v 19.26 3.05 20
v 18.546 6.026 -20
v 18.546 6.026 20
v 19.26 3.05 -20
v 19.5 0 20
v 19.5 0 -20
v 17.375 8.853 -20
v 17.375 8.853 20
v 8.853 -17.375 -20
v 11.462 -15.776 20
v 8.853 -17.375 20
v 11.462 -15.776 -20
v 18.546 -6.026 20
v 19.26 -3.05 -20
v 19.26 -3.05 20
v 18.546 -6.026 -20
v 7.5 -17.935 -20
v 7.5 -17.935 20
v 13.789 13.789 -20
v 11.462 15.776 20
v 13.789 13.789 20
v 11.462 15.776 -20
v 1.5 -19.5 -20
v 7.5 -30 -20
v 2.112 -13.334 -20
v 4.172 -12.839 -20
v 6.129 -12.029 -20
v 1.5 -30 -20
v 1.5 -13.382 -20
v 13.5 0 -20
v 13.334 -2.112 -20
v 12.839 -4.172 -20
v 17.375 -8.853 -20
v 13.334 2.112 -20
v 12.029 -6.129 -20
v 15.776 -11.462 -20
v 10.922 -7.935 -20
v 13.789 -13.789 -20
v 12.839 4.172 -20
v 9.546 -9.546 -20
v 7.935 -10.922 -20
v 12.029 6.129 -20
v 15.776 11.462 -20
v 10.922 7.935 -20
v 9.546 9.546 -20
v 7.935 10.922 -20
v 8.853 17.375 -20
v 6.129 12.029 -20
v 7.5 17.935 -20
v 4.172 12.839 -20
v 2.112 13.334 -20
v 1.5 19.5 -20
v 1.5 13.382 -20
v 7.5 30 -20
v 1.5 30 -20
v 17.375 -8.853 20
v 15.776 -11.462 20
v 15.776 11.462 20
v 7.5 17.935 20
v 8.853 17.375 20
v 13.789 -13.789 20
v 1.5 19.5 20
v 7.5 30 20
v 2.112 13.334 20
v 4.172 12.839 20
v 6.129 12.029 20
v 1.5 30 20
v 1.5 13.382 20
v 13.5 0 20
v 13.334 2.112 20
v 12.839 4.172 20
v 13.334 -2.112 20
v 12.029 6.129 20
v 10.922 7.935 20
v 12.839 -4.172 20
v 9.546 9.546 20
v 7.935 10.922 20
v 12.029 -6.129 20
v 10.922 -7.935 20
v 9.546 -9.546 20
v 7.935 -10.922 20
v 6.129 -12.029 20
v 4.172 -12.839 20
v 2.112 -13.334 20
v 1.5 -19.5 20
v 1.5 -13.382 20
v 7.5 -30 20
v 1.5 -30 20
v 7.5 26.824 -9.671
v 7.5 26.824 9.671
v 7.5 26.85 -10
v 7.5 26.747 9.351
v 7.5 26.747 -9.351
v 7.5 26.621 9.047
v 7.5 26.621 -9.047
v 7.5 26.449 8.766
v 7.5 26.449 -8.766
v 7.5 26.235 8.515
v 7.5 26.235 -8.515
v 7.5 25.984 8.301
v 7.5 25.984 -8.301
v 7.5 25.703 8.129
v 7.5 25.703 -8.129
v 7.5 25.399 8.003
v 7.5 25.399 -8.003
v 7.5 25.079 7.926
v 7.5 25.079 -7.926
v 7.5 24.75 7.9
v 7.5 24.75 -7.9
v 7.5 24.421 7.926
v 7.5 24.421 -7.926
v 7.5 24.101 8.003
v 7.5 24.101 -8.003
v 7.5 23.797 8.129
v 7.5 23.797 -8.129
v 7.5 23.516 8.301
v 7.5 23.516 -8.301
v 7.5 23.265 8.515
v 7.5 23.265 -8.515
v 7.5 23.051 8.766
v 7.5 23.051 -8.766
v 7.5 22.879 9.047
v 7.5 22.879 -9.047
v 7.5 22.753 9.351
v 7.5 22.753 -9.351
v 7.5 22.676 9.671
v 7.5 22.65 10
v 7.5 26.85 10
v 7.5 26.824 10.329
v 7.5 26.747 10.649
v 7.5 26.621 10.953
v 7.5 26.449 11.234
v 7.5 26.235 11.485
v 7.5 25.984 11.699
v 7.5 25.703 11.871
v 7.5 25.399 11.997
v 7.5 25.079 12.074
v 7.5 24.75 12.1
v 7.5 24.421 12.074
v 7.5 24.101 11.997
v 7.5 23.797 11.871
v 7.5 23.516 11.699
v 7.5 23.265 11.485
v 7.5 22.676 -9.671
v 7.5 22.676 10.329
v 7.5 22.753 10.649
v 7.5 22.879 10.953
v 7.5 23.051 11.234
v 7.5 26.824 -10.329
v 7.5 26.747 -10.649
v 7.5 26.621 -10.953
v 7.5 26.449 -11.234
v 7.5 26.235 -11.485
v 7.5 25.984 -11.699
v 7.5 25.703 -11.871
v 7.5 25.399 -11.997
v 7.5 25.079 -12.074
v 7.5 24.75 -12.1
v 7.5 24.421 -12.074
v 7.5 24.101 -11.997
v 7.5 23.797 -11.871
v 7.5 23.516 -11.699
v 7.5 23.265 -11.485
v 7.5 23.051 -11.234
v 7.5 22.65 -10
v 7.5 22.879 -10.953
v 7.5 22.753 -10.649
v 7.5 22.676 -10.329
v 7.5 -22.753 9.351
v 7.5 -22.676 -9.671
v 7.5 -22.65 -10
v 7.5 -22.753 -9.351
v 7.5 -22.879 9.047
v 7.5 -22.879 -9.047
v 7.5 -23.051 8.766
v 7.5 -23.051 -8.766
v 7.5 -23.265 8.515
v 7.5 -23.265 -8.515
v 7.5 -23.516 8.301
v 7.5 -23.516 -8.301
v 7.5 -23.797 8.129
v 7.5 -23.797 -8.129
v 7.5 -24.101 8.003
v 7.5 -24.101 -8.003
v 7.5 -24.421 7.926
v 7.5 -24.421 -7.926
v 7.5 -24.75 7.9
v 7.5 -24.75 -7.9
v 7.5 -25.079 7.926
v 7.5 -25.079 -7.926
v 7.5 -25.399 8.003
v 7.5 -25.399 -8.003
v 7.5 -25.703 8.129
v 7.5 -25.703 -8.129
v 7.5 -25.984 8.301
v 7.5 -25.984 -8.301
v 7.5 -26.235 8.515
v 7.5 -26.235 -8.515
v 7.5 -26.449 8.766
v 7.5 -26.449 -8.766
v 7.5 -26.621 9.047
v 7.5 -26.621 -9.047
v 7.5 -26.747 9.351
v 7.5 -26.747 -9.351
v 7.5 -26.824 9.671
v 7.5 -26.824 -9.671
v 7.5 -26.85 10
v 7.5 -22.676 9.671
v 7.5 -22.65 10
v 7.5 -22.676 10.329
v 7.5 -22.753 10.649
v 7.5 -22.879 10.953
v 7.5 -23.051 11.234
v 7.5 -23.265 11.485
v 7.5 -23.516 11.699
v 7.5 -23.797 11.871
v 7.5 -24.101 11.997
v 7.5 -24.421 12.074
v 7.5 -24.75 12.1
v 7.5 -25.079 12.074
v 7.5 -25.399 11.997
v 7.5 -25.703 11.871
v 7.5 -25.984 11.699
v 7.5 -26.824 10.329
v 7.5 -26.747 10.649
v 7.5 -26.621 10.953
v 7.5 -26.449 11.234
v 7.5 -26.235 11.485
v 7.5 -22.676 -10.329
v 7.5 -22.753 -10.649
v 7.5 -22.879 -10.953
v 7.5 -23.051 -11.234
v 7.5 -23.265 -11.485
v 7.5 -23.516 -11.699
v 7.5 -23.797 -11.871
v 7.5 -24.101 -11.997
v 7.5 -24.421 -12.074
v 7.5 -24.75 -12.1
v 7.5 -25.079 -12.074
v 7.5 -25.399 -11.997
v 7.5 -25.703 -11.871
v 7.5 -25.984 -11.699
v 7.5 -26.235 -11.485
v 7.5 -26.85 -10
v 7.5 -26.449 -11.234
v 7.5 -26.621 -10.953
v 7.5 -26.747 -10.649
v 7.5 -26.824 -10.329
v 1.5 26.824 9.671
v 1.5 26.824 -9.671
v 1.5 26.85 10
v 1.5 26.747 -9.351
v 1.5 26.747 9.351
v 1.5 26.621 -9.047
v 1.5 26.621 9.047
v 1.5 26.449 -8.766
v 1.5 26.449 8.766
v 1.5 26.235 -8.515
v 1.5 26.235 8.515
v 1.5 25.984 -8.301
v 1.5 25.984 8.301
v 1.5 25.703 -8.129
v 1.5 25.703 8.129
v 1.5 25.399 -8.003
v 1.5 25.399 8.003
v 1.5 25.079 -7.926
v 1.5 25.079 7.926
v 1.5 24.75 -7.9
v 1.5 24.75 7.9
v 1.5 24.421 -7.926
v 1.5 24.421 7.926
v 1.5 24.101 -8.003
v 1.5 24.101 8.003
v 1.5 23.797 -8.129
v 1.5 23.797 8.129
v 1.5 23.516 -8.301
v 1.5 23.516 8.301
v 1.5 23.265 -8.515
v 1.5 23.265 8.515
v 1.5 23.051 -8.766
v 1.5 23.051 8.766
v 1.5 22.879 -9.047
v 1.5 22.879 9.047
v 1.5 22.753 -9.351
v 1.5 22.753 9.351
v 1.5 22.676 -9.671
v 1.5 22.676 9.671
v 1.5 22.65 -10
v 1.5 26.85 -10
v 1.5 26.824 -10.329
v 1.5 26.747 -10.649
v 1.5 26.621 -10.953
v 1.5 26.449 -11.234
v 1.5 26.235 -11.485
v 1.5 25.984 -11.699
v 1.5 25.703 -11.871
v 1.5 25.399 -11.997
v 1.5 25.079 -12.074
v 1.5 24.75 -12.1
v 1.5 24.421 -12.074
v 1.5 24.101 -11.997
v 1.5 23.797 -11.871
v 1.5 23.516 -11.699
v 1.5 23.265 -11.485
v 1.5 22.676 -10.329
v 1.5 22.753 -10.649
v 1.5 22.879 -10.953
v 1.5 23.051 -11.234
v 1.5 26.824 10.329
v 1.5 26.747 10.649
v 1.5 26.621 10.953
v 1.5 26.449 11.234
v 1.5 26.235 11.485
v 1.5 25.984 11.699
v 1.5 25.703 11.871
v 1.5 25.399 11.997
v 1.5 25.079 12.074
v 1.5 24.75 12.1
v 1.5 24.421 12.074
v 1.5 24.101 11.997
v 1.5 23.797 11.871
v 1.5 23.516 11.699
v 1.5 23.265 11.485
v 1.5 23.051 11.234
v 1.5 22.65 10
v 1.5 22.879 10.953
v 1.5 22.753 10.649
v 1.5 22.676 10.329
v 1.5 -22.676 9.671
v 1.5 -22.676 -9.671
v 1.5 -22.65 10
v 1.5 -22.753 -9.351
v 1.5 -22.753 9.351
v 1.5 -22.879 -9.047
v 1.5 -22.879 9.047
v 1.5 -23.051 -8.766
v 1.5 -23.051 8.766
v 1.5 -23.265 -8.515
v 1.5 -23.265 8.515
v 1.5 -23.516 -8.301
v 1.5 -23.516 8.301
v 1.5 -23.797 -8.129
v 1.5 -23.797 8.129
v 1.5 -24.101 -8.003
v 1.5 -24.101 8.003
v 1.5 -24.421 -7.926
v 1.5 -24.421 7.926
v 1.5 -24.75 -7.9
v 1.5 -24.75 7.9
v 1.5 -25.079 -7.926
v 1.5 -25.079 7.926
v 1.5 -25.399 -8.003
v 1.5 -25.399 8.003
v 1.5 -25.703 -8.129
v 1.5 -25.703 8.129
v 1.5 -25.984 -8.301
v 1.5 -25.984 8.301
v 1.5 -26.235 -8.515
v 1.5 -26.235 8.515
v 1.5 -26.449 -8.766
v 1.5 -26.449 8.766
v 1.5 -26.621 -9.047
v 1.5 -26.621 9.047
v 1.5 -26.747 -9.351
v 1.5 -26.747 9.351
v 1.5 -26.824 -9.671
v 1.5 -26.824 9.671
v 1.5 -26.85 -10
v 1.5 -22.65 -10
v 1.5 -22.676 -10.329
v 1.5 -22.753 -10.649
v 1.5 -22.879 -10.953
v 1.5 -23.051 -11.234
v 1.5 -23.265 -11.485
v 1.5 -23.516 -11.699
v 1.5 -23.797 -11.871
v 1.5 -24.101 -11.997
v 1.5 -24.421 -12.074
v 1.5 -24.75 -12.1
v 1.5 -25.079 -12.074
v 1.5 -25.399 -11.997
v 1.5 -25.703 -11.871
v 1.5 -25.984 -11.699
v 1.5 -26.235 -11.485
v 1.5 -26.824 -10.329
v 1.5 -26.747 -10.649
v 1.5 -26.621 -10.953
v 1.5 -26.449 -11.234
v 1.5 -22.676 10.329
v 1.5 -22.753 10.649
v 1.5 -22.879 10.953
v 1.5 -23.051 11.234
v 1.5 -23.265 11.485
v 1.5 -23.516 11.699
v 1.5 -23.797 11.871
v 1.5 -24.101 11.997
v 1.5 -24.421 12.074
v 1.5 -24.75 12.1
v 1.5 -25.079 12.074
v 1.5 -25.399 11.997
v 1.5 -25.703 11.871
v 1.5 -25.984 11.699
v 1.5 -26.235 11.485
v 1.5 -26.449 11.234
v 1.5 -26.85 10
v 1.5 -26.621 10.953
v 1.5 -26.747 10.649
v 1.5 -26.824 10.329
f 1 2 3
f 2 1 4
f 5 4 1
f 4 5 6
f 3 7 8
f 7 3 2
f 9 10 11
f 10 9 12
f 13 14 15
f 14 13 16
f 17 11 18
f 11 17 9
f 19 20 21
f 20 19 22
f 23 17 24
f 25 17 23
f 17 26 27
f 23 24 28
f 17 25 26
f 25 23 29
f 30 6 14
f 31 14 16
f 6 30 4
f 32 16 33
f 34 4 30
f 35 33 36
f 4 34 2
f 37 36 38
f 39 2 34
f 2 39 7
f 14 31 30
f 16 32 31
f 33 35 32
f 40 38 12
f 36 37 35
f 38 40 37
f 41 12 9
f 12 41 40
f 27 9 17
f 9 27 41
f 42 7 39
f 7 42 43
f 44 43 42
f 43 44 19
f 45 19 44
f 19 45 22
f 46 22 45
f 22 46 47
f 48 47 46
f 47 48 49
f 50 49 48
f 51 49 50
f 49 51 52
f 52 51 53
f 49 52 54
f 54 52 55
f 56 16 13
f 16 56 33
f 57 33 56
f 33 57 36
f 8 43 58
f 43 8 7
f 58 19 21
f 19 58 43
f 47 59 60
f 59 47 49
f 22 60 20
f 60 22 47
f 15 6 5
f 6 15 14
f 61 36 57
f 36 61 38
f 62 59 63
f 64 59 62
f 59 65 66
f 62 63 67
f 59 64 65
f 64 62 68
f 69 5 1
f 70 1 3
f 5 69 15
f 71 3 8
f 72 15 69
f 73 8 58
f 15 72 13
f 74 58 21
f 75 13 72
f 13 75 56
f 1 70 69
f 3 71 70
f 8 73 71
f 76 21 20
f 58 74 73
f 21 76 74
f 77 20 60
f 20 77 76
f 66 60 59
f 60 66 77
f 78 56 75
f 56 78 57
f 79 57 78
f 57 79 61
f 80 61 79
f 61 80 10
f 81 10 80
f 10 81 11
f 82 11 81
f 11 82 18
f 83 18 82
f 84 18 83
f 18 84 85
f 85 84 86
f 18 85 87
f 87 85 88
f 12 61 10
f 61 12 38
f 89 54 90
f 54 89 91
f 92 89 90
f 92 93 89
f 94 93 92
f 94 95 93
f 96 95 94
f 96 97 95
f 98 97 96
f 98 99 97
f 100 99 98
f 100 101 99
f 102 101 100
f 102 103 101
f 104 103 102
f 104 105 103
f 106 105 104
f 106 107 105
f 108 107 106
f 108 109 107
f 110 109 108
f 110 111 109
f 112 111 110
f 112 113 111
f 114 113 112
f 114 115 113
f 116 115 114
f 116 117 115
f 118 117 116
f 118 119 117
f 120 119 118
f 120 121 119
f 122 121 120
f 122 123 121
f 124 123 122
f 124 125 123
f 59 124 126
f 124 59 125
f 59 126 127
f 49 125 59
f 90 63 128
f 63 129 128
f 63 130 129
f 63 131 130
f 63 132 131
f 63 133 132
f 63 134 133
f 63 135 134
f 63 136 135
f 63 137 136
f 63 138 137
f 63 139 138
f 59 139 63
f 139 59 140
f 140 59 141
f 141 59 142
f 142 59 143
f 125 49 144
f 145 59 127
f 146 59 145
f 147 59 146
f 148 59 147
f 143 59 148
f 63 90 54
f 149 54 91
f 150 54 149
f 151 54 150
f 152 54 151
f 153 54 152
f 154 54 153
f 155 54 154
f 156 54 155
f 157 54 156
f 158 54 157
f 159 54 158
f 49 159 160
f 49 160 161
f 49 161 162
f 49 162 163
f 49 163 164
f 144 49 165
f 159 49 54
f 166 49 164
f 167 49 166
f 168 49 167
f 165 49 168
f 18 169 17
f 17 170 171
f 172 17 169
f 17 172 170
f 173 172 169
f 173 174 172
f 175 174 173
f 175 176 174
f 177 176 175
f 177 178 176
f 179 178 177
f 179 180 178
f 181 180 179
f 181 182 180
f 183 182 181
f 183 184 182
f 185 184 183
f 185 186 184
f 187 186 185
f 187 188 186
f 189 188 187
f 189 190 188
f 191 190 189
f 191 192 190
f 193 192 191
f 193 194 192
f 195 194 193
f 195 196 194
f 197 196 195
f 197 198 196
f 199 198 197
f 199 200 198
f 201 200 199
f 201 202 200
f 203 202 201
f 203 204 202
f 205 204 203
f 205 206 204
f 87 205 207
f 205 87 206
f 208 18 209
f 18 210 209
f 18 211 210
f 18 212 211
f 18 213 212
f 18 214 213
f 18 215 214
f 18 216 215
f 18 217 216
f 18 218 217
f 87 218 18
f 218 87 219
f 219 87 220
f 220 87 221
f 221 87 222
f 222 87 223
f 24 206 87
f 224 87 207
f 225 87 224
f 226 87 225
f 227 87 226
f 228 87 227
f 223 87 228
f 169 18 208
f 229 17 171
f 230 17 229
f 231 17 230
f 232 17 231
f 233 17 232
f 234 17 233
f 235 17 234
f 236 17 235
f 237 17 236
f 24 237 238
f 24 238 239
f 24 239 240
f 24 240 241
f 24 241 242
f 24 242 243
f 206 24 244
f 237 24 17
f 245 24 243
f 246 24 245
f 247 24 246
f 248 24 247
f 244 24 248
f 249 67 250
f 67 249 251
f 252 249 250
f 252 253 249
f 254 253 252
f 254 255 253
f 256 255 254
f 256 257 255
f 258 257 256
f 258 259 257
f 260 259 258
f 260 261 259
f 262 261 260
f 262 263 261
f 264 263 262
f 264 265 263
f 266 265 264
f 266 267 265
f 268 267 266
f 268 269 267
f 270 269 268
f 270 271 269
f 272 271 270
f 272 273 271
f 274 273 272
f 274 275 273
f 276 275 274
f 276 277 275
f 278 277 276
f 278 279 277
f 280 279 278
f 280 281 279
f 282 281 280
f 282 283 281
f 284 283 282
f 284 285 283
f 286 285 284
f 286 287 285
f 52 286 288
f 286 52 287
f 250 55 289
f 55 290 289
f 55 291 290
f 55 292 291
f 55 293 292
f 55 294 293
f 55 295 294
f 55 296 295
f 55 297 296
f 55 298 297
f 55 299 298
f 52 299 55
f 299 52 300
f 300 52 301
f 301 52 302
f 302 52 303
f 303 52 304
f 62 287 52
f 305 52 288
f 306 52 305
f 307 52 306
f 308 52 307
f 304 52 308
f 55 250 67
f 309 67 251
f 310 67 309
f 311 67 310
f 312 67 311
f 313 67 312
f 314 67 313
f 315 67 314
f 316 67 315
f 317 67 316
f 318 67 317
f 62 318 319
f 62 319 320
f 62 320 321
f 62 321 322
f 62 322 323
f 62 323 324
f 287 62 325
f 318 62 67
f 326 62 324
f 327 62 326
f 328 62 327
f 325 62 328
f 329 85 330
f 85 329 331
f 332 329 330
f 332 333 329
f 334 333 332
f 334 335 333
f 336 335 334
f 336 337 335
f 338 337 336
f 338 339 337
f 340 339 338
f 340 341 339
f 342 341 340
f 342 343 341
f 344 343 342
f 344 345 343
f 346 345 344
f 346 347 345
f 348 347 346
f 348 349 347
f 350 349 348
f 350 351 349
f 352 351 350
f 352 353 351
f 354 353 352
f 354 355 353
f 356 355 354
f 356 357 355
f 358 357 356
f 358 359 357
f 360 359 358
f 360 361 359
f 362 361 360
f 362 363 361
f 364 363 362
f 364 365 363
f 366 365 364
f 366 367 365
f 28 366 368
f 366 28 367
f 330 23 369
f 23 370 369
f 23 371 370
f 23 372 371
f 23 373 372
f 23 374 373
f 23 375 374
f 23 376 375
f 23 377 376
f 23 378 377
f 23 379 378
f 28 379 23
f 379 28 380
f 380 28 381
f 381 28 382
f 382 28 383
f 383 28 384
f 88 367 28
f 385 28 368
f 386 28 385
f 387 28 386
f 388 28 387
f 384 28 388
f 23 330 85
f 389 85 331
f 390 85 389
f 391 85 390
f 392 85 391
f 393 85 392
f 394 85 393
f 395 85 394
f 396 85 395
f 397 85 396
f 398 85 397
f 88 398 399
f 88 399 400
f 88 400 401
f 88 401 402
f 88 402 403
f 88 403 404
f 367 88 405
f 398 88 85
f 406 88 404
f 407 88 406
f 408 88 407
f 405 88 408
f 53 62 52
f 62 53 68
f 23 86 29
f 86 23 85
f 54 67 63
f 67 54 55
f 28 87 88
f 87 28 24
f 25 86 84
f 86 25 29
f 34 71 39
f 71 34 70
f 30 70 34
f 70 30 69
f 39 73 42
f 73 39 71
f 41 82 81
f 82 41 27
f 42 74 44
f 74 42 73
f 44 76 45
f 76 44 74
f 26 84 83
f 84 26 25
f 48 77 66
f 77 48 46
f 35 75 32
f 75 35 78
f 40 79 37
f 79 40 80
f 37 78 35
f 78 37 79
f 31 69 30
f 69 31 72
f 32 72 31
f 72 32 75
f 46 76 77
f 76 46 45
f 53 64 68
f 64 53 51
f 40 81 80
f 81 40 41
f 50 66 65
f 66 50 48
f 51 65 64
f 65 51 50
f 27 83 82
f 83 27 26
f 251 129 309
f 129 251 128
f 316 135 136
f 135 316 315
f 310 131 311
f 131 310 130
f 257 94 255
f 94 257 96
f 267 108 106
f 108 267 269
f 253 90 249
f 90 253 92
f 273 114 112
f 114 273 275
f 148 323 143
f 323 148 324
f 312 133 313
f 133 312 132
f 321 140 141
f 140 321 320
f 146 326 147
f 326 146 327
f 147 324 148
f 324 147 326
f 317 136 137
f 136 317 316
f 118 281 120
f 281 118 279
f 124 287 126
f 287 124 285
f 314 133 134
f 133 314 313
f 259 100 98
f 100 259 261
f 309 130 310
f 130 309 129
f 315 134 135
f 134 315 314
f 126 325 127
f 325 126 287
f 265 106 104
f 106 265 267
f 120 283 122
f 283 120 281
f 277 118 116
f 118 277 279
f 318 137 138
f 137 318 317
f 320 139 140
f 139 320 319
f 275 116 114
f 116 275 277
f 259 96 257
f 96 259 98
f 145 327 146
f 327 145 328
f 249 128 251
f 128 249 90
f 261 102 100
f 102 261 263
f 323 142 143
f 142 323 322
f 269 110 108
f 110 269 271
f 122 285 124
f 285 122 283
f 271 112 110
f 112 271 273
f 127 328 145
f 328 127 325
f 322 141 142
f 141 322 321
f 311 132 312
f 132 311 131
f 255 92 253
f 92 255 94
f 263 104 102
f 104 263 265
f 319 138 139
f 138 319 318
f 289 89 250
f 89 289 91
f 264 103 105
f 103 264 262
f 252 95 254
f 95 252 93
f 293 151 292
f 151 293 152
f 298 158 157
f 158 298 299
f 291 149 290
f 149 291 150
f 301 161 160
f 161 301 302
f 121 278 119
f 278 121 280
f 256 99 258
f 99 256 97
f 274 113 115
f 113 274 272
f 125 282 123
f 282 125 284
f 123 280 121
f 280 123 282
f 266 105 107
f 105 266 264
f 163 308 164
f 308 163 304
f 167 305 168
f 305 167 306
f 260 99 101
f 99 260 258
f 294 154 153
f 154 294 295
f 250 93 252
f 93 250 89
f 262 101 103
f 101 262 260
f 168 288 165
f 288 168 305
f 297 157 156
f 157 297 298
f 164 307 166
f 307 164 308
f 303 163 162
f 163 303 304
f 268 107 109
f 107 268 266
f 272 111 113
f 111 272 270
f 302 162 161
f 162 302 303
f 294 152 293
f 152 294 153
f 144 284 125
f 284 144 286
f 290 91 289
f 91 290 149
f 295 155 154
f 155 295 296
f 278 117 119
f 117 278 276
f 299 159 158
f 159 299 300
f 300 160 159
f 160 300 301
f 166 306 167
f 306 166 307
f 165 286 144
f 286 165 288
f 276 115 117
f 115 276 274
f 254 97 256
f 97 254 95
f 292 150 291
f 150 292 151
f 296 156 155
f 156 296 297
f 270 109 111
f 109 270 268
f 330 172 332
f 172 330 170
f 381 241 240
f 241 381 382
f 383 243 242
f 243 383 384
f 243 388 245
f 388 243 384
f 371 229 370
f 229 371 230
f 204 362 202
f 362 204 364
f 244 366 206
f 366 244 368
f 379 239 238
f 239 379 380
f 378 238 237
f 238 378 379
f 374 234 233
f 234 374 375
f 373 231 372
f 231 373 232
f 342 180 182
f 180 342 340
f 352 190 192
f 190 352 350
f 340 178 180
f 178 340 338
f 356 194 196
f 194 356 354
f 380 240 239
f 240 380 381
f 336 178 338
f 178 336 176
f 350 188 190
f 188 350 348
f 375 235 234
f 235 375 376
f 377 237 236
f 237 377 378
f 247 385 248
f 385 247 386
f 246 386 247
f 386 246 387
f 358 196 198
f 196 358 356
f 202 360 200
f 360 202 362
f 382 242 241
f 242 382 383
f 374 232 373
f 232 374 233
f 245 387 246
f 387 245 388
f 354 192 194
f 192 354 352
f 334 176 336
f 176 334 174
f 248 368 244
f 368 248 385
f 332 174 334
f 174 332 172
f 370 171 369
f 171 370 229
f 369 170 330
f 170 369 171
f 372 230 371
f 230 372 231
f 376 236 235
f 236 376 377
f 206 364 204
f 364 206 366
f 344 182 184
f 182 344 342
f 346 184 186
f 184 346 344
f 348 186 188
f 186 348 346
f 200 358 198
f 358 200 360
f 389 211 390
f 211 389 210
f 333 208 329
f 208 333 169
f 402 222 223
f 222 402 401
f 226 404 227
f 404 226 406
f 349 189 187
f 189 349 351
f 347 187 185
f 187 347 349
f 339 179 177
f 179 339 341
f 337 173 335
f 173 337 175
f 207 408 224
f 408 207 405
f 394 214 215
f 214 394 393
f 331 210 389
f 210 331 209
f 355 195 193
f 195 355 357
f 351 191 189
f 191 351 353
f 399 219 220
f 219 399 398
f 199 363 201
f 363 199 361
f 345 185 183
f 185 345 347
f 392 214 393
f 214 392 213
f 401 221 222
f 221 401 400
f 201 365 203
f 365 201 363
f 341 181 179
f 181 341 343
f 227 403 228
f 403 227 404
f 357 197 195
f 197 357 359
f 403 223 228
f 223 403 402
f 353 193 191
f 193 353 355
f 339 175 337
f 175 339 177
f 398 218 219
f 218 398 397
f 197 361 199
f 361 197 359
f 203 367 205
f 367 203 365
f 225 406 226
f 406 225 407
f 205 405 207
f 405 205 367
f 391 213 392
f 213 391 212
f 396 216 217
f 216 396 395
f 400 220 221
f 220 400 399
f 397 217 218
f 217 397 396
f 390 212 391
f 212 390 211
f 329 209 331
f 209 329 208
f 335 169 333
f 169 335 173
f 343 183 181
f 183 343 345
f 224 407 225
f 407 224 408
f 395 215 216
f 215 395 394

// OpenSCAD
// file: ../SRC/WINDGAUGE01A_D02.scad
$fn=40; // model faces resolution.
include <../configuration.scad>



//Drzak na sloup - cast bez drzaku anemometru
module WINDGAUGE01A_D02(){
	
difference()
    {
    union()
        {
        //základní válec
        cylinder(h=D02_vyska_uchytky,r=(D02_prumer_obruby+2*D02_sila_materialu)/2,center=true);
		//úchytové plošky		
        translate([D02_dotahova_vzdalenost+D02_sila_materialu/2,0,0]){cube([D02_sila_materialu,D02_delka_celeho_uchytu,D02_vyska_uchytky],center=true);}
		}
    
    //válec na odečet
    cylinder(h=D02_vyska_uchytky+0.01,r=D02_prumer_obruby/2,center=true);     
	        
    //kvádr na odecet
	translate([D02_dotahova_vzdalenost-(D02_prumer_obruby+2*D02_sila_materialu)/2,0,0]){cube([D02_prumer_obruby+2*D02_sila_materialu,D02_prumer_obruby+2*D02_sila_materialu,D02_vyska_uchytky+0.01],center=true);}
		
	//otvory na sroub
	translate([D02_dotahova_vzdalenost,(D02_delka_celeho_uchytu/2-D02_prumer_obruby/2-D02_sila_materialu)/2+D02_prumer_obruby/2+D02_sila_materialu,D02_vyska_uchytky/4]){rotate([0,90,0]){cylinder(h=D02_sila_materialu+0.01,r=D02_prumer_uchytneho_sroubu/2);}}
        
    translate([D02_dotahova_vzdalenost,(D02_delka_celeho_uchytu/2-D02_prumer_obruby/2-D02_sila_materialu)/2+D02_prumer_obruby/2+D02_sila_materialu,-D02_vyska_uchytky/4]){rotate([0,90,0]){cylinder(h=D02_sila_materialu+0.01,r=D02_prumer_uchytneho_sroubu/2);}}
        
	translate([D02_dotahova_vzdalenost,-((D02_delka_celeho_uchytu/2-D02_prumer_obruby/2-D02_sila_materialu)/2+D02_prumer_obruby/2+D02_sila_materialu),-D02_vyska_uchytky/4]){rotate([0,90,0]){cylinder(h=D02_sila_materialu+0.01,r=D02_prumer_uchytneho_sroubu/2);}}

    translate([D02_dotahova_vzdalenost,-((D02_delka_celeho_uchytu/2-D02_prumer_obruby/2-D02_sila_materialu)/2+D02_prumer_obruby/2+D02_sila_materialu),D02_vyska_uchytky/4]){rotate([0,90,0]){cylinder(h=D02_sila_materialu+0.01,r=D02_prumer_uchytneho_sroubu/2);}}	
	
    }
}

//WINDGAUGE02A_D02();
// file: ../configuration.scad
//$fn=40; // model faces resolution.

//COMMON PARAMETERS
global_clearance = 0.5; // additional space where needed due to printer precision
layer_thickness = 0.3; // layer which is going to be removed after printing
//M3 x 12 Bolt
M3_nut_diameter = 6.6;
M3_nut_height = 2.7;
M3_bolt_diameter = 3.2;
M3_bolt_head_height = 3;
M3_bolt_length = 12;
//M5 Bolt
M5_bolt_diameter = 5.5;
M5_nut_height = 4.5;
M5_nut_diameter = 9.4;
//M6 Bolt
M6_bolt_diameter = 6.5;
M6_nut_height = 4.9;
M6_nut_diameter = 11.8;


//----------------------------------------------------------------
//----------------------------------------------------------------
//WINDGAUGE02A_S02 - Parametry pro hlavni valec anemometru
S01_hloubka_zavitu=4;
S01_vyska=110; //80
S01_prumer_vnitrni=50;
S01_sila_materialu=1.2;
S01_vyska_horni_zavit=10;
S01_vyska_spodniho_zavitu=10;
S01_sila_drzaku_RJ11=3; //vyška drážky
S01_hrana_A_RJ11=12.3;
S01_hrana_B_RJ11=19;
S01_tolerance_zavit=1.5;

//Rozměry ložiska se závity
//LO_spodni_prumer=22;
LO_spodni_prumer=17.2; //bez krytu
LO_vyska_bez_krytu=15;
LO_doraz_prumer=44.3;
LO_horni_prumer=7.7;
LO_vyska_spodni_doraz=5;
LO_vyska_horni_doraz=9;
LO_vyska_dorazu=0;





//Obecné parametry
prumer_osicky=5.1;



//Parametry loziska
lozisko_prumer_vnitrni=4.9;
lozisko_prumer_vnejsi=16.1;
lozisko_vyska=5;
lozisko_prekryv=1.5;

//Parametry magnetu
magnet_prumer=6.3;
magnet_vyska=5;
magnet_zapusteni=2;
magnet_tolerance_prumeru=0.2;

//Parametry sroubu
prumer_sroubu=3.4;
prumer_hlavy_sroubu=8.2;
vyska_hlavy_sroubu=4.3;
vyska_matky=3;
sirka_matky=6.7;

sirka_matky_tol=0.175;
prumer_orechu=10;

//WINDGAUGE02A_R01 //pro lopatku
L01_hrana_drzaku_a=10;
L01_hrana_drzaku_b=3;
L01_delka_uchytu=19;
L01_prumer_lopatky=40;
L01_sila_materialu_lopatky=0.9;

//WINDGAUGE02A_D02 Anemometer holder
//   | |   Top ring with Screw-thread
//  /   \  Body
// |_____| Base
D02_magnet_base_height = 4.5 + 1.5*global_clearance; // HS-13 M5 magnet height without bolt
D02_magnet_diameter = 16.1 + global_clearance; // HS-13 M5 magnet diameter
D02_flat_magnet_diameter = 18.1 + global_clearance; // HS-13 M5 magnet diameter
D02_wall_thickness = 5; // body wall thickness
D02_connector_spacing = 40; // main body cut-through for connectors
D02_base_diameter = 140; // diameter of holder base
D02_base_height = max(M6_nut_height + 1.5,
                      D02_magnet_base_height + M5_nut_height/2 + 1.5); // height of holder base
D02_body_height = 60 - D02_base_height; // height of body between base and top ring
D02_screw_diameter = S01_prumer_vnitrni - S01_tolerance_zavit; // scew-thread diameter based on stand S01
D02_thread_height = S01_vyska_spodniho_zavitu; // screw-thread height based on stand S01
D02_top_ring_inner_diameter = D02_screw_diameter - 6; // inner diameter of top ring
D02_top_ring_outer_diameter = D02_screw_diameter + 4; // outer diameter of top ring
D02_top_ring_height = D02_thread_height + 5; // height of top ring
D02_total_height = D02_base_height + D02_body_height + D02_top_ring_height; // total height of anemometer holder
// Following parameters are obsolete, maintained only for compatibility.
D01_material_pod_zavitem = D02_top_ring_height - D02_thread_height;
D01_material_za_zavitem = D02_screw_diameter - D02_top_ring_inner_diameter;
D01_material_pred_zavitem = D02_top_ring_outer_diameter - D02_screw_diameter;
D01_polomer_zakladny = D02_base_diameter/2;
D01_sila_setny_spodniho_drzaku=D02_wall_thickness;
D01_vyska_spodni_casti_drzaku = D02_body_height + D02_base_height;
D01_sirka_otvoru_pro_konektor = D02_connector_spacing;
D01_ucyhtna_matice_material_nad = D02_base_height - M6_nut_height;
D01_uchytna_matice_vyska = M6_nut_height;
D01_uchytna_matice_sirka = M6_nut_diameter;
D01_uchytny_sroub_prumer = M6_bolt_diameter;

// Following parameters are actually used in D01 model.
//WINDGAUGE02A_D02 //uchyt na sloup
D02_sila_materialu=6;
D02_vyska_uchytky=40;
D02_prumer_obruby=27; // 3/4 trubka
D02_delka_celeho_uchytu=60;
D02_dotahova_vzdalenost=1.5;
D02_prumer_uchytneho_sroubu=4.2;
D02_sirka_matky=9.1; //pro M4
D02_vyska_matky=3;


//WINDGAUGE02A_R01 //rotor s prekritim statoru
R01_vyska_prekryti_statoru=10;
R01_sila_materialu_pro_prekriti=1.3;
R01_mezera_mezi_statorem_rotorem=3;

//WINDGAUGE02A_R03 //drzak magnetu
R05_sirka_matky=10;



R03_prumer_zavitu=40;
R04_zavit_vyska=5;
R02_zavit_vyska=10;
R01_zavit_vyska=5;
R03_mezera_mezi_statorem_rotorem=3;

R02_delka_kridla=45;
R02_vzdalenost_der=25;

R02_delka_vyrovnnavaci_tyce=35;
R02_hrana_drzaku=14;
R02_sila_materialu_pod_tyci=5;
R02_sila_materialu_kridla=1.2;
R02_sila_materialu_kridla_tolerance=0.3;

R05_vyska_kridla=100;
R05_delka_kridla=100;


//S04
I2CDIFF01A_sirka_kon=16.5; //sirka konektoru
I2CDIFF01A_vyska_kon=13.5; //vyska konektoru
I2CDIFF01A_sirka_mod_otvory=4; //kolik modul zabira der
I2CDIFF01A_vyska_PCB=2; //vyska mezi albase a konektorem
S04_sila_materialu=2;

//S04_USBI2C01A
USBI2C01A_sirka_kon=12; //sirka konektoru
USBI2C01A_vyska_kon=11; //vyska konektoru
USBI2C01A_sirka_mod_otvory=3; //kolik modul zabira der
USBI2C01A_vyska_PCB=2; //vyska mezi albase a konektorem


//WINDGAUGE03A_R03 // Venturi tube
R03_wide_D = 36; // Venturi wide tube inner diameter
R03_narrow_D = R03_wide_D/1.4; // Venturi narrow tube inner diameter
R03_global_clearance = global_clearance; // additional space where needed due to printer precision
R03_PCB_top_rim = 5.5; // vertical distance from top of tube to top of PCB
R03_PCB_height = 41; // height of PCB casing - if changed check casing
R03_PCB_width = 14; // width of PCB casing - if changed check casing
R03_PCB_depth = 3.7; // depth of PCB casing - if changed check casing
R03_PCB_connector_overlay = 2.5; // additional depth of PCB casing on connectors side - if changed check casing
R03_PCB_elevation = 2; // additional elevation of PCB for waterproofing
R03_air_tube_diameter = 2; // air tubes diameter
R03_sensor_housing_offset = 15;  // distance from venturi tube height to sensor housing drop
R03_sensor_offset = 2.2;  // SDP33 distance from PCB border to sensor
R03_sensor_pitch = 4.3;  // SDP33 distance between sensors
R03_sensor_diameter = 3.5;  // SDP33 sensor diameter
R03_sensor_depth = 2.5;  // SDP33 sensor depth
R03_slip_ring_offset = 0; // slip-ring offset from tube center
R03_venturi_tube_height = 150;  // Venturi tube height (limited by max print size)
R03_wall_thickness = 3; // Venturi tube wall thickness
R03_sealing_ring_thickness = 1.5; // sealing ring size
R03_fin_width = 0.8; // width of vertical stabilizator
R03_fin_length = 150; // length of vertical stabilizator
R03_fin_height = 150; // height of vertical stabilizator
R03_fin_holder_width = M3_bolt_length + M3_nut_height;
R03_fin_holder_height = M3_nut_diameter + 2*R03_wall_thickness;
R03_fin_holder_depth = R03_wide_D/2 + R03_fin_holder_height;
R03_balance_shelf_width = 20; // width of shelf for balance weights
R03_balance_shelf_height = 10; // height of shelf for balance weights
// main file
$fn=100; // model faces resolution.
include <../configuration.scad>
use <../SRC/WINDGAUGE01A_D02.scad>

rotate([0, 0, 0])
    translate([0,0,0])
        WINDGAUGE01A_D02();

            
